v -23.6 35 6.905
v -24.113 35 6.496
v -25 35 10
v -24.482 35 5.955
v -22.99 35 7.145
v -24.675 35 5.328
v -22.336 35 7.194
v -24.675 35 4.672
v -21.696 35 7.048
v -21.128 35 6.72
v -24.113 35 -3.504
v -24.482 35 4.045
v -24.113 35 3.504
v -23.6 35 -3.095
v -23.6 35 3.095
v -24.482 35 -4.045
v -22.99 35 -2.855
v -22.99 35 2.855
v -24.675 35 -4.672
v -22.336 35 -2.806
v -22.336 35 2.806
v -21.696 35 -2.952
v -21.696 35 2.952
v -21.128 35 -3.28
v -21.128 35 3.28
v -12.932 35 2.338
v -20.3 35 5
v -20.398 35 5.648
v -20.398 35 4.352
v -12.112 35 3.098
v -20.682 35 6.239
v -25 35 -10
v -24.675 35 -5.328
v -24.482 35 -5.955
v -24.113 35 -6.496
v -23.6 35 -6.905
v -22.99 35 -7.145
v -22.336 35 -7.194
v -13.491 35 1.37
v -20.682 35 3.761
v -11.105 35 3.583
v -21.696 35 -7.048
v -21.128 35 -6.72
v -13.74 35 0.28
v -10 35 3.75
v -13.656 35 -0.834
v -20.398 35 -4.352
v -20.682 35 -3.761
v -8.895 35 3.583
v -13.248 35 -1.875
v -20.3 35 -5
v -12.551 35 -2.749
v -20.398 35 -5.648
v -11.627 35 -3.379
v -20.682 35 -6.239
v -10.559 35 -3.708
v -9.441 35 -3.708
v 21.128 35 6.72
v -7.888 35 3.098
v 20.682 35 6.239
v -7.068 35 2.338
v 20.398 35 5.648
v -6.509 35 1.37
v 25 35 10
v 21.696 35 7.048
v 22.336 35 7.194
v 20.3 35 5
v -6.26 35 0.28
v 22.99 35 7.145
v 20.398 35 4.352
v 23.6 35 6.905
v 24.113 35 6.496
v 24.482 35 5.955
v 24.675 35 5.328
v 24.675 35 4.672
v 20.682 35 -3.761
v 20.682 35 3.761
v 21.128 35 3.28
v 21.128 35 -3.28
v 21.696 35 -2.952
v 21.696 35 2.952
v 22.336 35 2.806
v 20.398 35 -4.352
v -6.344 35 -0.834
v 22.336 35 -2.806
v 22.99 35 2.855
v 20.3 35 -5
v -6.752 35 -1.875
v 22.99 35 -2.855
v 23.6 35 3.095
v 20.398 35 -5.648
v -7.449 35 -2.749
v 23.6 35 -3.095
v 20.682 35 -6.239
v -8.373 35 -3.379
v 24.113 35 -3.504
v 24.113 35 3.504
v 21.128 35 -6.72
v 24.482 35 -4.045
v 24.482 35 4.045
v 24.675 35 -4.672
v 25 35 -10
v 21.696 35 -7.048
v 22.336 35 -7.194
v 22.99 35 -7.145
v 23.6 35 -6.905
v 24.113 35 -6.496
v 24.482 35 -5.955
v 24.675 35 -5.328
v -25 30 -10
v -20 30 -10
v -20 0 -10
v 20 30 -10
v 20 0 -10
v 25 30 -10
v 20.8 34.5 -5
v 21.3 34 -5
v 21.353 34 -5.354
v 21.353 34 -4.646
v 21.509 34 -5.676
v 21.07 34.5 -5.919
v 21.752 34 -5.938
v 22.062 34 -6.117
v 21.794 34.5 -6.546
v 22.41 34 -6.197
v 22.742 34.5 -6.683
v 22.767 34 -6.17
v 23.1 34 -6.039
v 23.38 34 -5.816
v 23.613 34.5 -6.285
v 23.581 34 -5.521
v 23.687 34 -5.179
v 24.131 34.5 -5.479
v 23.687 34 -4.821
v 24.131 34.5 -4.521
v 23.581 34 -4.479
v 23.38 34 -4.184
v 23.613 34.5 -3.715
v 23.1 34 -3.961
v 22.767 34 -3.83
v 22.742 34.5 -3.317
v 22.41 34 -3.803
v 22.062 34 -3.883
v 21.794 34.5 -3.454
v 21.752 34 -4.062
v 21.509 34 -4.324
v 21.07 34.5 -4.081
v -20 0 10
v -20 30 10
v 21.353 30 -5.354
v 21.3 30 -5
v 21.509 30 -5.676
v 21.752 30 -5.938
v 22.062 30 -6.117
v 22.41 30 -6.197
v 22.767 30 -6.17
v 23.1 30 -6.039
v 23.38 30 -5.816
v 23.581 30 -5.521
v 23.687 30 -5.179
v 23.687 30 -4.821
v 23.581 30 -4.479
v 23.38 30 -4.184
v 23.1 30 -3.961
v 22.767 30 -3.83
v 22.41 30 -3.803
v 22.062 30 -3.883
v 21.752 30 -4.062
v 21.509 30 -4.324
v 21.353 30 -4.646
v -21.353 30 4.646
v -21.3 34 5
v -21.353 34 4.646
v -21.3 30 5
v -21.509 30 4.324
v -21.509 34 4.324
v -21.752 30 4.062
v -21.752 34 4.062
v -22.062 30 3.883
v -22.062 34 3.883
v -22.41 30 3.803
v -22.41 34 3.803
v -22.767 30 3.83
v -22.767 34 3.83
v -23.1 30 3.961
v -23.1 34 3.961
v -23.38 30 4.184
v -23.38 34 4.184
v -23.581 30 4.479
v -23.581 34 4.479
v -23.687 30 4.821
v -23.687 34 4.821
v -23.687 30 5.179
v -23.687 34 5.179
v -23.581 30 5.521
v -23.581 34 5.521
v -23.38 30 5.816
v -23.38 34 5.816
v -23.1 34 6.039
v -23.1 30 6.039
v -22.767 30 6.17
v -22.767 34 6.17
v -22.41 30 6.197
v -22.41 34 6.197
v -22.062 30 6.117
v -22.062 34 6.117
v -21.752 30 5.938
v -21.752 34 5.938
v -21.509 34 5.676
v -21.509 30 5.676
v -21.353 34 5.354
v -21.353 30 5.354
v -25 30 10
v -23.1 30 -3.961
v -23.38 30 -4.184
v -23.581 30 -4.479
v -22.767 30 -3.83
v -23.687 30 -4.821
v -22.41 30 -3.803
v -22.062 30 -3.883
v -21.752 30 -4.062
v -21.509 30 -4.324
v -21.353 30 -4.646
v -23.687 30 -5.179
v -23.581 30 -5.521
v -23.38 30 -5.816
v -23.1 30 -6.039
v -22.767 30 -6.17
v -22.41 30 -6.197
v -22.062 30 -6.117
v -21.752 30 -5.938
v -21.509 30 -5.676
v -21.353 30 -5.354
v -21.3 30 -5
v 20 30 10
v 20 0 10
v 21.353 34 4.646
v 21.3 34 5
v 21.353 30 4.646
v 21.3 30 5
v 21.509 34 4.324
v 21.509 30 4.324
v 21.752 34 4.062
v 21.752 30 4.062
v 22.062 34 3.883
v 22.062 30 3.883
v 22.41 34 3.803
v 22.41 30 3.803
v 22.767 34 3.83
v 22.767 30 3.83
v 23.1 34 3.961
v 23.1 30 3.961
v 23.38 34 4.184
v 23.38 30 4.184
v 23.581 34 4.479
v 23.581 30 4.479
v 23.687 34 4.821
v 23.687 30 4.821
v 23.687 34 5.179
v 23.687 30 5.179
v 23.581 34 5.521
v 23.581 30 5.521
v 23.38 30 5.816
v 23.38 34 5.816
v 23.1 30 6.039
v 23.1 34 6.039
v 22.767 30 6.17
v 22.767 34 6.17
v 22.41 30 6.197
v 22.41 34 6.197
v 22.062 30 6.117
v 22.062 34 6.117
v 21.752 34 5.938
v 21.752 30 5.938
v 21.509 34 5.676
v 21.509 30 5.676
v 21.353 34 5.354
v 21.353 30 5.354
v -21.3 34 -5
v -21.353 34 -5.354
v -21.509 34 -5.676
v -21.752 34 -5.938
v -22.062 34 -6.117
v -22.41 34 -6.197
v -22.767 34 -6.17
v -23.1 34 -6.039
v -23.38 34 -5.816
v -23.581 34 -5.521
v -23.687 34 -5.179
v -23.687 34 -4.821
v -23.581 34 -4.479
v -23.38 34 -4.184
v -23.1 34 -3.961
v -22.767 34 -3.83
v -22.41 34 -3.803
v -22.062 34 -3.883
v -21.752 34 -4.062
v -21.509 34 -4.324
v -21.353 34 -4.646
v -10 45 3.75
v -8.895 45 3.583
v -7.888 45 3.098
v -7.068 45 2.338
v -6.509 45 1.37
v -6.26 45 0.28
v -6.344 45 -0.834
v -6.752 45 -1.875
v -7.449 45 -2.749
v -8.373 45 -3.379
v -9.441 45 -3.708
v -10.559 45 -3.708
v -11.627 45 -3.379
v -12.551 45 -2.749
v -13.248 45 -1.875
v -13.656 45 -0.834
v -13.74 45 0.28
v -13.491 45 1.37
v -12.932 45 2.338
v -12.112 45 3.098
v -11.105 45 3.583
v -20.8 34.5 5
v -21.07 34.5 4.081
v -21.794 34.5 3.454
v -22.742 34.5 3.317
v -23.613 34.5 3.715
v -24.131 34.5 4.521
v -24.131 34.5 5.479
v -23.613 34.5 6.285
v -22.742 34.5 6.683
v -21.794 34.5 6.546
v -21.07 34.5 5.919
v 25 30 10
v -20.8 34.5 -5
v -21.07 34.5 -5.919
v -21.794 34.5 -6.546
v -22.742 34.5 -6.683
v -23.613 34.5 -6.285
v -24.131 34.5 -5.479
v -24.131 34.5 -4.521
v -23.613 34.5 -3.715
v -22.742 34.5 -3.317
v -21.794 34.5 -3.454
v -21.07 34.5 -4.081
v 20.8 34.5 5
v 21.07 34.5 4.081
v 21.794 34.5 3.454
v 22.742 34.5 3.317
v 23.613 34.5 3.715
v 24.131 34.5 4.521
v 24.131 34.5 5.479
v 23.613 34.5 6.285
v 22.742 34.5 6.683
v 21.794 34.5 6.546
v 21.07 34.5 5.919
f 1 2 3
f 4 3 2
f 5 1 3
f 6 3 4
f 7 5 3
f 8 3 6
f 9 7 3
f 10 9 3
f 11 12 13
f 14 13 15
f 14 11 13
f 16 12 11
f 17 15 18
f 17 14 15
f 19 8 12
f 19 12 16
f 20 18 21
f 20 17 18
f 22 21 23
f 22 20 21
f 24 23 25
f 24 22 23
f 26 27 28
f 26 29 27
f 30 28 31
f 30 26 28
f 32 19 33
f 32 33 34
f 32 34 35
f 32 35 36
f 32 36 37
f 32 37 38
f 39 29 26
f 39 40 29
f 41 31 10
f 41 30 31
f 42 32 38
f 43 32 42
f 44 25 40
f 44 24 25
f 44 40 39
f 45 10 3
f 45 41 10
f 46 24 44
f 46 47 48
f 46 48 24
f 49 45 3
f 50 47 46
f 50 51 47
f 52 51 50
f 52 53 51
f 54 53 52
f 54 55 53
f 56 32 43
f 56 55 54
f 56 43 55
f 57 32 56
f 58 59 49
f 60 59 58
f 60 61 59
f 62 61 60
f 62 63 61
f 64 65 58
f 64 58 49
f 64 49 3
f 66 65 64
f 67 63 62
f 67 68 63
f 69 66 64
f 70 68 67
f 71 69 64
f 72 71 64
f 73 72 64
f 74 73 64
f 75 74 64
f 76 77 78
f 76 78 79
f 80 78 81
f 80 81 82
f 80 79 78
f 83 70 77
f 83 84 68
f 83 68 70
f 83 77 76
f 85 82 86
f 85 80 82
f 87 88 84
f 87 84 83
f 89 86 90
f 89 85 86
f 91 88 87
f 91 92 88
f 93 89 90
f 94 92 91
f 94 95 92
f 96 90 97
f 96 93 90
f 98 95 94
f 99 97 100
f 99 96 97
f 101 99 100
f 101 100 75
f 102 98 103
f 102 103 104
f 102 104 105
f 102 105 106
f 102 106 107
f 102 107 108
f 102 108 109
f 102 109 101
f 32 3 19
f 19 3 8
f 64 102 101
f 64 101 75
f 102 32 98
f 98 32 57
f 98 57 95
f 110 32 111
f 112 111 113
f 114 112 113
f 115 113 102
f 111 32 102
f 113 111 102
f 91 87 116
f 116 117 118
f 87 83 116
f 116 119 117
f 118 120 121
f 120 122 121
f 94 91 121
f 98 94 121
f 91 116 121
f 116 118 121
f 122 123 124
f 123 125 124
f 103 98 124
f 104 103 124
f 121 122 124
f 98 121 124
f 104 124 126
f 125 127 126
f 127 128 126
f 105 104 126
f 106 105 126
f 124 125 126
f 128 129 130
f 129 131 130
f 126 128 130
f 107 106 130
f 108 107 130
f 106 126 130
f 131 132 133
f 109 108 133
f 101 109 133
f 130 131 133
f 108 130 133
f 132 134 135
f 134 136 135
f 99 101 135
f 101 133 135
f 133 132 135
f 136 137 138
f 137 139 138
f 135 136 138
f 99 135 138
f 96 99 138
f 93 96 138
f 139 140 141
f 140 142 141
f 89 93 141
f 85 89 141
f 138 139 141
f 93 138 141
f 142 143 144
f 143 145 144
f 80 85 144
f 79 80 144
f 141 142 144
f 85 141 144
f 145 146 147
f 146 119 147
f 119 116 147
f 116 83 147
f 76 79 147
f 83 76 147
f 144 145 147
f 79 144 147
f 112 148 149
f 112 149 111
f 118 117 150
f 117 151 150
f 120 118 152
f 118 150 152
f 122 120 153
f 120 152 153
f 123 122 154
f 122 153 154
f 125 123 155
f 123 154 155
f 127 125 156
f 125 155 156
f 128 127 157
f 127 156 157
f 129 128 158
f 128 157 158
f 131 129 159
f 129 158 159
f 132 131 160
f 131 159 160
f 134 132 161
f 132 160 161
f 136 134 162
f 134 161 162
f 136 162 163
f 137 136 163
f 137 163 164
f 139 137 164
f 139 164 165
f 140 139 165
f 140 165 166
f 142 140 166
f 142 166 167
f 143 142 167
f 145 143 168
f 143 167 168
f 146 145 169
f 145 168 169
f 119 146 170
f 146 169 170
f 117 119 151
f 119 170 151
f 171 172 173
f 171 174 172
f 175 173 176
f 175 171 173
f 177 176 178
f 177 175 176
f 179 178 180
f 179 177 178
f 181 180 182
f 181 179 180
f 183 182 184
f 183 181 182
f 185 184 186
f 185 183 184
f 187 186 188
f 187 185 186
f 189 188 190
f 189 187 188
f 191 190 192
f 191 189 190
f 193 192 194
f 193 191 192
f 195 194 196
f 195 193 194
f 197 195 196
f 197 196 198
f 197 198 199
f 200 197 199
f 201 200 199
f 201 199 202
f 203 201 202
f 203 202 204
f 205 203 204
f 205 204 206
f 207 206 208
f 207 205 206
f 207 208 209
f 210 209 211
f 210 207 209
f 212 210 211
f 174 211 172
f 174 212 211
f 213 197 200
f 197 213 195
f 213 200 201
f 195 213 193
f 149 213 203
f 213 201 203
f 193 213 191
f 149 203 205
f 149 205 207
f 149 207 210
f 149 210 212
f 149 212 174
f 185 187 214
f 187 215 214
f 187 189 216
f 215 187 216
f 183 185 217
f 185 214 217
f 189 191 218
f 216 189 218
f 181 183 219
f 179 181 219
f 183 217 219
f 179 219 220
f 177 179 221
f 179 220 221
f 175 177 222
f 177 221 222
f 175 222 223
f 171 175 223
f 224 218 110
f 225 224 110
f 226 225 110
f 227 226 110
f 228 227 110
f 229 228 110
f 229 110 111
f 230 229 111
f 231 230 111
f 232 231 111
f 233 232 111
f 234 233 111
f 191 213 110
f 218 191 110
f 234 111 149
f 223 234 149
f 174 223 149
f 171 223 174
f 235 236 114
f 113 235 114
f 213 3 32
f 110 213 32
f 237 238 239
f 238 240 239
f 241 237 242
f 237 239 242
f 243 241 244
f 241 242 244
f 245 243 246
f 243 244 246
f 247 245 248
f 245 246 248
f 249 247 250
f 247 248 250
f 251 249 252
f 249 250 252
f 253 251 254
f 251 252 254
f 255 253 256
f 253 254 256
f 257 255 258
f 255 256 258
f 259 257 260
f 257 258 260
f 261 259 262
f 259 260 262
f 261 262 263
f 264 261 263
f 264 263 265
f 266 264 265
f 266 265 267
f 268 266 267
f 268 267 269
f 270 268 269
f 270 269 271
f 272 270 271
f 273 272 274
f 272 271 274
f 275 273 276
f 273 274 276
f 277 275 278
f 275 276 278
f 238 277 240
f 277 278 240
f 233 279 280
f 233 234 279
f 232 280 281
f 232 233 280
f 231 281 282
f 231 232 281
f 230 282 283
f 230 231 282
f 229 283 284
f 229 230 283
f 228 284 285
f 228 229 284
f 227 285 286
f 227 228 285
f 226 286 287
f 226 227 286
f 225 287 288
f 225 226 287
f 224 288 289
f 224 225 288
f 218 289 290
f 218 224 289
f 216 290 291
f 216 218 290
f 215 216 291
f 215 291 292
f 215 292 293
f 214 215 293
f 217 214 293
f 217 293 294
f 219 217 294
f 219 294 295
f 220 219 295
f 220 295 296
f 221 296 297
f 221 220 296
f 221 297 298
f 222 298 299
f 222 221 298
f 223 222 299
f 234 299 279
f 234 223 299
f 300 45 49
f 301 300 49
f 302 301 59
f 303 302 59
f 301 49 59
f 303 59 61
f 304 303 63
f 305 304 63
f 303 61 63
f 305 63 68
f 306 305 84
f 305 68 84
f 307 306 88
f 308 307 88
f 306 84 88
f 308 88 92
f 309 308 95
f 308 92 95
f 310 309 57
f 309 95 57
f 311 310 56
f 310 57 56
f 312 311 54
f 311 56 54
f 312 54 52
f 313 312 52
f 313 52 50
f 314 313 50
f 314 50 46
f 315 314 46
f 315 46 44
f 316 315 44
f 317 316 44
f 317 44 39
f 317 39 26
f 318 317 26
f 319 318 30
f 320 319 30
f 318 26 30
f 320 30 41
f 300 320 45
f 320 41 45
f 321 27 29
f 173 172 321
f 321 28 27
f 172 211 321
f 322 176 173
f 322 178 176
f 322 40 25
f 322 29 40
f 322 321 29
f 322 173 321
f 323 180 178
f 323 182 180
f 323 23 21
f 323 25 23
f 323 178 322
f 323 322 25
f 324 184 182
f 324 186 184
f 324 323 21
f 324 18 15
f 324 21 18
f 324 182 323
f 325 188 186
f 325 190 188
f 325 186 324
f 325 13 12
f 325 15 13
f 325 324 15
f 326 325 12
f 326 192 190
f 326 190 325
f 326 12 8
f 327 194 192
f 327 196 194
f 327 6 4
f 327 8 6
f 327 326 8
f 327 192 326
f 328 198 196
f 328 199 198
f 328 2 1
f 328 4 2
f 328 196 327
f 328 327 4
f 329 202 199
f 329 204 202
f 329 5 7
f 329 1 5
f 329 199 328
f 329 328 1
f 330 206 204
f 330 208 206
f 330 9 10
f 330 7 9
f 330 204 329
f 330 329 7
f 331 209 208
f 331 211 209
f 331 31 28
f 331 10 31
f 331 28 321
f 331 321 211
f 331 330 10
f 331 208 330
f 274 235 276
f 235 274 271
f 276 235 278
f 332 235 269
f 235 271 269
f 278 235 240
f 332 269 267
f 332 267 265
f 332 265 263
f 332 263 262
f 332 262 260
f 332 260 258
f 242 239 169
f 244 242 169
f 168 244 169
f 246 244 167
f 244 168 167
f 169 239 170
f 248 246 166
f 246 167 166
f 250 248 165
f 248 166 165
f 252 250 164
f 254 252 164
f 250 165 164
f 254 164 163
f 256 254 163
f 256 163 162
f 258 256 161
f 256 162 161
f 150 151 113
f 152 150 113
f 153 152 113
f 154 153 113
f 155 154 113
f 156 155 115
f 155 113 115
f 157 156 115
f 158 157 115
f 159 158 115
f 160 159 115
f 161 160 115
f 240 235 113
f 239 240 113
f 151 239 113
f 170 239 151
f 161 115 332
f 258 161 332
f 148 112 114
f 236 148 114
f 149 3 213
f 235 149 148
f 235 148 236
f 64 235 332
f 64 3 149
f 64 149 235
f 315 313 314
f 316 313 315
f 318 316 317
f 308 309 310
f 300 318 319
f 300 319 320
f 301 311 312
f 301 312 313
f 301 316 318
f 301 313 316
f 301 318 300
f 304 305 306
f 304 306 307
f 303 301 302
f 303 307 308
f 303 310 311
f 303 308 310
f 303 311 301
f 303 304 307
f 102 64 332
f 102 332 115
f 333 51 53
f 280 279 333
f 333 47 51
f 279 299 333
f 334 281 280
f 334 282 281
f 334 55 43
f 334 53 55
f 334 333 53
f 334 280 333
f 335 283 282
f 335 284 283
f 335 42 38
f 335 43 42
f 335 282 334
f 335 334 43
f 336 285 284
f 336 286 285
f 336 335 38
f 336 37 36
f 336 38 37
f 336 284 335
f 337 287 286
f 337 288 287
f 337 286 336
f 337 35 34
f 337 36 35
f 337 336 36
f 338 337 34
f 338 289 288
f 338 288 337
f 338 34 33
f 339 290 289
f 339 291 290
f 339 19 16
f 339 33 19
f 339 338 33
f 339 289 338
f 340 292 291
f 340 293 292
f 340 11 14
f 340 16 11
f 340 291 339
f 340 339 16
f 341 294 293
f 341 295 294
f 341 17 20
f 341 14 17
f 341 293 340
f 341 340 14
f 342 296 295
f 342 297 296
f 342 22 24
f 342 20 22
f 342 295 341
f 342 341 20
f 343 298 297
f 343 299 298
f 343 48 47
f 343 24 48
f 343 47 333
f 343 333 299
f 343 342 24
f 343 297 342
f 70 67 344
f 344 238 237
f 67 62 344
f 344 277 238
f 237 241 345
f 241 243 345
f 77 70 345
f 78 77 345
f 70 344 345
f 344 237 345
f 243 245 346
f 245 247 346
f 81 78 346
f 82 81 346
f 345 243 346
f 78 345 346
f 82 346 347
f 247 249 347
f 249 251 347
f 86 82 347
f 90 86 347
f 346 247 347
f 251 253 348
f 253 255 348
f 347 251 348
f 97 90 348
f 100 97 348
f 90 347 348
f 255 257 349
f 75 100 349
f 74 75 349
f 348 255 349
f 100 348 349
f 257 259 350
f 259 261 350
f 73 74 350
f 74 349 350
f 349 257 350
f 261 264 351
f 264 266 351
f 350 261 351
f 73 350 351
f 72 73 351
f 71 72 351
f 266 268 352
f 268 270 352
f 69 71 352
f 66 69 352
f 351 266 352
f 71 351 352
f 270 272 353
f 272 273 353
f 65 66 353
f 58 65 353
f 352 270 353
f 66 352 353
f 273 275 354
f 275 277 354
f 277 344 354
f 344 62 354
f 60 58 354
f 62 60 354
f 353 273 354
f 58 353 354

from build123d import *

# Parameters (mm, degrees)
SKETCH1_W                                       = 40
SKETCH1_H                                       = 20
BOSS_EXTRUDE1_DEPTH                             = 35
SKETCH2_W                                       = 5
SKETCH2_H                                       = 20
BOSS_EXTRUDE2_DEPTH                             = 5
SKETCH3_R                                       = 3.75
BOSS_EXTRUDE3_DEPTH                             = 10
CSK_FOR_M2_FLAT_HEAD_MACHINE_SCREW2_D           = 2.4
CSK_FOR_M2_FLAT_HEAD_MACHINE_SCREW2_CSINK_D     = 4.4
CSK_FOR_M2_FLAT_HEAD_MACHINE_SCREW2_CSINK_ANGLE = 90


with BuildPart() as part:
    # Sketch1 → Boss-Extrude1 (new body)
    with BuildSketch(Plane(origin=(0, 0, 0), x_dir=(1, 0, 0), z_dir=(0, 1, 0))):
        Rectangle(SKETCH1_W, SKETCH1_H)
    extrude(amount=BOSS_EXTRUDE1_DEPTH)

    # Sketch2 → Boss-Extrude2 (add)
    with BuildSketch(Plane(origin=(0, 35, 0), x_dir=(1, 0, 0), z_dir=(0, 1, 0))):
        with Locations((-22.5, 0)):
            Rectangle(SKETCH2_W, SKETCH2_H)
        with Locations((22.5, 0)):
            Rectangle(SKETCH2_W, SKETCH2_H)
    extrude(amount=-BOSS_EXTRUDE2_DEPTH)

    # Sketch3 → Boss-Extrude3 (add)
    with BuildSketch(Plane(origin=(0, 35, 0), x_dir=(1, 0, 0), z_dir=(0, 1, 0))):
        with Locations(Location((-10, 0, 0), (0, 0, 270))):
            Circle(SKETCH3_R)
    extrude(amount=BOSS_EXTRUDE3_DEPTH)

    # CSK for M2 Flat Head Machine Screw2 (through all)
    with Locations(Plane(origin=(0, 35, 0), x_dir=(1, 0, 0), z_dir=(0, 1, 0))):
        with Locations((22.5, -5), (22.5, 5)):
            csk_for_m2_flat_head_machine_screw2 = CounterSinkHole(CSK_FOR_M2_FLAT_HEAD_MACHINE_SCREW2_D / 2, CSK_FOR_M2_FLAT_HEAD_MACHINE_SCREW2_CSINK_D / 2, counter_sink_angle=CSK_FOR_M2_FLAT_HEAD_MACHINE_SCREW2_CSINK_ANGLE)

    # Mirror1: CSK for M2 Flat Head Machine Screw2 across plane
    add(csk_for_m2_flat_head_machine_screw2.mirror(Plane(origin=(0, 0, 0), x_dir=(0, 0, 1), z_dir=(1, 0, 0))), mode=Mode.SUBTRACT)


solid = part.part
